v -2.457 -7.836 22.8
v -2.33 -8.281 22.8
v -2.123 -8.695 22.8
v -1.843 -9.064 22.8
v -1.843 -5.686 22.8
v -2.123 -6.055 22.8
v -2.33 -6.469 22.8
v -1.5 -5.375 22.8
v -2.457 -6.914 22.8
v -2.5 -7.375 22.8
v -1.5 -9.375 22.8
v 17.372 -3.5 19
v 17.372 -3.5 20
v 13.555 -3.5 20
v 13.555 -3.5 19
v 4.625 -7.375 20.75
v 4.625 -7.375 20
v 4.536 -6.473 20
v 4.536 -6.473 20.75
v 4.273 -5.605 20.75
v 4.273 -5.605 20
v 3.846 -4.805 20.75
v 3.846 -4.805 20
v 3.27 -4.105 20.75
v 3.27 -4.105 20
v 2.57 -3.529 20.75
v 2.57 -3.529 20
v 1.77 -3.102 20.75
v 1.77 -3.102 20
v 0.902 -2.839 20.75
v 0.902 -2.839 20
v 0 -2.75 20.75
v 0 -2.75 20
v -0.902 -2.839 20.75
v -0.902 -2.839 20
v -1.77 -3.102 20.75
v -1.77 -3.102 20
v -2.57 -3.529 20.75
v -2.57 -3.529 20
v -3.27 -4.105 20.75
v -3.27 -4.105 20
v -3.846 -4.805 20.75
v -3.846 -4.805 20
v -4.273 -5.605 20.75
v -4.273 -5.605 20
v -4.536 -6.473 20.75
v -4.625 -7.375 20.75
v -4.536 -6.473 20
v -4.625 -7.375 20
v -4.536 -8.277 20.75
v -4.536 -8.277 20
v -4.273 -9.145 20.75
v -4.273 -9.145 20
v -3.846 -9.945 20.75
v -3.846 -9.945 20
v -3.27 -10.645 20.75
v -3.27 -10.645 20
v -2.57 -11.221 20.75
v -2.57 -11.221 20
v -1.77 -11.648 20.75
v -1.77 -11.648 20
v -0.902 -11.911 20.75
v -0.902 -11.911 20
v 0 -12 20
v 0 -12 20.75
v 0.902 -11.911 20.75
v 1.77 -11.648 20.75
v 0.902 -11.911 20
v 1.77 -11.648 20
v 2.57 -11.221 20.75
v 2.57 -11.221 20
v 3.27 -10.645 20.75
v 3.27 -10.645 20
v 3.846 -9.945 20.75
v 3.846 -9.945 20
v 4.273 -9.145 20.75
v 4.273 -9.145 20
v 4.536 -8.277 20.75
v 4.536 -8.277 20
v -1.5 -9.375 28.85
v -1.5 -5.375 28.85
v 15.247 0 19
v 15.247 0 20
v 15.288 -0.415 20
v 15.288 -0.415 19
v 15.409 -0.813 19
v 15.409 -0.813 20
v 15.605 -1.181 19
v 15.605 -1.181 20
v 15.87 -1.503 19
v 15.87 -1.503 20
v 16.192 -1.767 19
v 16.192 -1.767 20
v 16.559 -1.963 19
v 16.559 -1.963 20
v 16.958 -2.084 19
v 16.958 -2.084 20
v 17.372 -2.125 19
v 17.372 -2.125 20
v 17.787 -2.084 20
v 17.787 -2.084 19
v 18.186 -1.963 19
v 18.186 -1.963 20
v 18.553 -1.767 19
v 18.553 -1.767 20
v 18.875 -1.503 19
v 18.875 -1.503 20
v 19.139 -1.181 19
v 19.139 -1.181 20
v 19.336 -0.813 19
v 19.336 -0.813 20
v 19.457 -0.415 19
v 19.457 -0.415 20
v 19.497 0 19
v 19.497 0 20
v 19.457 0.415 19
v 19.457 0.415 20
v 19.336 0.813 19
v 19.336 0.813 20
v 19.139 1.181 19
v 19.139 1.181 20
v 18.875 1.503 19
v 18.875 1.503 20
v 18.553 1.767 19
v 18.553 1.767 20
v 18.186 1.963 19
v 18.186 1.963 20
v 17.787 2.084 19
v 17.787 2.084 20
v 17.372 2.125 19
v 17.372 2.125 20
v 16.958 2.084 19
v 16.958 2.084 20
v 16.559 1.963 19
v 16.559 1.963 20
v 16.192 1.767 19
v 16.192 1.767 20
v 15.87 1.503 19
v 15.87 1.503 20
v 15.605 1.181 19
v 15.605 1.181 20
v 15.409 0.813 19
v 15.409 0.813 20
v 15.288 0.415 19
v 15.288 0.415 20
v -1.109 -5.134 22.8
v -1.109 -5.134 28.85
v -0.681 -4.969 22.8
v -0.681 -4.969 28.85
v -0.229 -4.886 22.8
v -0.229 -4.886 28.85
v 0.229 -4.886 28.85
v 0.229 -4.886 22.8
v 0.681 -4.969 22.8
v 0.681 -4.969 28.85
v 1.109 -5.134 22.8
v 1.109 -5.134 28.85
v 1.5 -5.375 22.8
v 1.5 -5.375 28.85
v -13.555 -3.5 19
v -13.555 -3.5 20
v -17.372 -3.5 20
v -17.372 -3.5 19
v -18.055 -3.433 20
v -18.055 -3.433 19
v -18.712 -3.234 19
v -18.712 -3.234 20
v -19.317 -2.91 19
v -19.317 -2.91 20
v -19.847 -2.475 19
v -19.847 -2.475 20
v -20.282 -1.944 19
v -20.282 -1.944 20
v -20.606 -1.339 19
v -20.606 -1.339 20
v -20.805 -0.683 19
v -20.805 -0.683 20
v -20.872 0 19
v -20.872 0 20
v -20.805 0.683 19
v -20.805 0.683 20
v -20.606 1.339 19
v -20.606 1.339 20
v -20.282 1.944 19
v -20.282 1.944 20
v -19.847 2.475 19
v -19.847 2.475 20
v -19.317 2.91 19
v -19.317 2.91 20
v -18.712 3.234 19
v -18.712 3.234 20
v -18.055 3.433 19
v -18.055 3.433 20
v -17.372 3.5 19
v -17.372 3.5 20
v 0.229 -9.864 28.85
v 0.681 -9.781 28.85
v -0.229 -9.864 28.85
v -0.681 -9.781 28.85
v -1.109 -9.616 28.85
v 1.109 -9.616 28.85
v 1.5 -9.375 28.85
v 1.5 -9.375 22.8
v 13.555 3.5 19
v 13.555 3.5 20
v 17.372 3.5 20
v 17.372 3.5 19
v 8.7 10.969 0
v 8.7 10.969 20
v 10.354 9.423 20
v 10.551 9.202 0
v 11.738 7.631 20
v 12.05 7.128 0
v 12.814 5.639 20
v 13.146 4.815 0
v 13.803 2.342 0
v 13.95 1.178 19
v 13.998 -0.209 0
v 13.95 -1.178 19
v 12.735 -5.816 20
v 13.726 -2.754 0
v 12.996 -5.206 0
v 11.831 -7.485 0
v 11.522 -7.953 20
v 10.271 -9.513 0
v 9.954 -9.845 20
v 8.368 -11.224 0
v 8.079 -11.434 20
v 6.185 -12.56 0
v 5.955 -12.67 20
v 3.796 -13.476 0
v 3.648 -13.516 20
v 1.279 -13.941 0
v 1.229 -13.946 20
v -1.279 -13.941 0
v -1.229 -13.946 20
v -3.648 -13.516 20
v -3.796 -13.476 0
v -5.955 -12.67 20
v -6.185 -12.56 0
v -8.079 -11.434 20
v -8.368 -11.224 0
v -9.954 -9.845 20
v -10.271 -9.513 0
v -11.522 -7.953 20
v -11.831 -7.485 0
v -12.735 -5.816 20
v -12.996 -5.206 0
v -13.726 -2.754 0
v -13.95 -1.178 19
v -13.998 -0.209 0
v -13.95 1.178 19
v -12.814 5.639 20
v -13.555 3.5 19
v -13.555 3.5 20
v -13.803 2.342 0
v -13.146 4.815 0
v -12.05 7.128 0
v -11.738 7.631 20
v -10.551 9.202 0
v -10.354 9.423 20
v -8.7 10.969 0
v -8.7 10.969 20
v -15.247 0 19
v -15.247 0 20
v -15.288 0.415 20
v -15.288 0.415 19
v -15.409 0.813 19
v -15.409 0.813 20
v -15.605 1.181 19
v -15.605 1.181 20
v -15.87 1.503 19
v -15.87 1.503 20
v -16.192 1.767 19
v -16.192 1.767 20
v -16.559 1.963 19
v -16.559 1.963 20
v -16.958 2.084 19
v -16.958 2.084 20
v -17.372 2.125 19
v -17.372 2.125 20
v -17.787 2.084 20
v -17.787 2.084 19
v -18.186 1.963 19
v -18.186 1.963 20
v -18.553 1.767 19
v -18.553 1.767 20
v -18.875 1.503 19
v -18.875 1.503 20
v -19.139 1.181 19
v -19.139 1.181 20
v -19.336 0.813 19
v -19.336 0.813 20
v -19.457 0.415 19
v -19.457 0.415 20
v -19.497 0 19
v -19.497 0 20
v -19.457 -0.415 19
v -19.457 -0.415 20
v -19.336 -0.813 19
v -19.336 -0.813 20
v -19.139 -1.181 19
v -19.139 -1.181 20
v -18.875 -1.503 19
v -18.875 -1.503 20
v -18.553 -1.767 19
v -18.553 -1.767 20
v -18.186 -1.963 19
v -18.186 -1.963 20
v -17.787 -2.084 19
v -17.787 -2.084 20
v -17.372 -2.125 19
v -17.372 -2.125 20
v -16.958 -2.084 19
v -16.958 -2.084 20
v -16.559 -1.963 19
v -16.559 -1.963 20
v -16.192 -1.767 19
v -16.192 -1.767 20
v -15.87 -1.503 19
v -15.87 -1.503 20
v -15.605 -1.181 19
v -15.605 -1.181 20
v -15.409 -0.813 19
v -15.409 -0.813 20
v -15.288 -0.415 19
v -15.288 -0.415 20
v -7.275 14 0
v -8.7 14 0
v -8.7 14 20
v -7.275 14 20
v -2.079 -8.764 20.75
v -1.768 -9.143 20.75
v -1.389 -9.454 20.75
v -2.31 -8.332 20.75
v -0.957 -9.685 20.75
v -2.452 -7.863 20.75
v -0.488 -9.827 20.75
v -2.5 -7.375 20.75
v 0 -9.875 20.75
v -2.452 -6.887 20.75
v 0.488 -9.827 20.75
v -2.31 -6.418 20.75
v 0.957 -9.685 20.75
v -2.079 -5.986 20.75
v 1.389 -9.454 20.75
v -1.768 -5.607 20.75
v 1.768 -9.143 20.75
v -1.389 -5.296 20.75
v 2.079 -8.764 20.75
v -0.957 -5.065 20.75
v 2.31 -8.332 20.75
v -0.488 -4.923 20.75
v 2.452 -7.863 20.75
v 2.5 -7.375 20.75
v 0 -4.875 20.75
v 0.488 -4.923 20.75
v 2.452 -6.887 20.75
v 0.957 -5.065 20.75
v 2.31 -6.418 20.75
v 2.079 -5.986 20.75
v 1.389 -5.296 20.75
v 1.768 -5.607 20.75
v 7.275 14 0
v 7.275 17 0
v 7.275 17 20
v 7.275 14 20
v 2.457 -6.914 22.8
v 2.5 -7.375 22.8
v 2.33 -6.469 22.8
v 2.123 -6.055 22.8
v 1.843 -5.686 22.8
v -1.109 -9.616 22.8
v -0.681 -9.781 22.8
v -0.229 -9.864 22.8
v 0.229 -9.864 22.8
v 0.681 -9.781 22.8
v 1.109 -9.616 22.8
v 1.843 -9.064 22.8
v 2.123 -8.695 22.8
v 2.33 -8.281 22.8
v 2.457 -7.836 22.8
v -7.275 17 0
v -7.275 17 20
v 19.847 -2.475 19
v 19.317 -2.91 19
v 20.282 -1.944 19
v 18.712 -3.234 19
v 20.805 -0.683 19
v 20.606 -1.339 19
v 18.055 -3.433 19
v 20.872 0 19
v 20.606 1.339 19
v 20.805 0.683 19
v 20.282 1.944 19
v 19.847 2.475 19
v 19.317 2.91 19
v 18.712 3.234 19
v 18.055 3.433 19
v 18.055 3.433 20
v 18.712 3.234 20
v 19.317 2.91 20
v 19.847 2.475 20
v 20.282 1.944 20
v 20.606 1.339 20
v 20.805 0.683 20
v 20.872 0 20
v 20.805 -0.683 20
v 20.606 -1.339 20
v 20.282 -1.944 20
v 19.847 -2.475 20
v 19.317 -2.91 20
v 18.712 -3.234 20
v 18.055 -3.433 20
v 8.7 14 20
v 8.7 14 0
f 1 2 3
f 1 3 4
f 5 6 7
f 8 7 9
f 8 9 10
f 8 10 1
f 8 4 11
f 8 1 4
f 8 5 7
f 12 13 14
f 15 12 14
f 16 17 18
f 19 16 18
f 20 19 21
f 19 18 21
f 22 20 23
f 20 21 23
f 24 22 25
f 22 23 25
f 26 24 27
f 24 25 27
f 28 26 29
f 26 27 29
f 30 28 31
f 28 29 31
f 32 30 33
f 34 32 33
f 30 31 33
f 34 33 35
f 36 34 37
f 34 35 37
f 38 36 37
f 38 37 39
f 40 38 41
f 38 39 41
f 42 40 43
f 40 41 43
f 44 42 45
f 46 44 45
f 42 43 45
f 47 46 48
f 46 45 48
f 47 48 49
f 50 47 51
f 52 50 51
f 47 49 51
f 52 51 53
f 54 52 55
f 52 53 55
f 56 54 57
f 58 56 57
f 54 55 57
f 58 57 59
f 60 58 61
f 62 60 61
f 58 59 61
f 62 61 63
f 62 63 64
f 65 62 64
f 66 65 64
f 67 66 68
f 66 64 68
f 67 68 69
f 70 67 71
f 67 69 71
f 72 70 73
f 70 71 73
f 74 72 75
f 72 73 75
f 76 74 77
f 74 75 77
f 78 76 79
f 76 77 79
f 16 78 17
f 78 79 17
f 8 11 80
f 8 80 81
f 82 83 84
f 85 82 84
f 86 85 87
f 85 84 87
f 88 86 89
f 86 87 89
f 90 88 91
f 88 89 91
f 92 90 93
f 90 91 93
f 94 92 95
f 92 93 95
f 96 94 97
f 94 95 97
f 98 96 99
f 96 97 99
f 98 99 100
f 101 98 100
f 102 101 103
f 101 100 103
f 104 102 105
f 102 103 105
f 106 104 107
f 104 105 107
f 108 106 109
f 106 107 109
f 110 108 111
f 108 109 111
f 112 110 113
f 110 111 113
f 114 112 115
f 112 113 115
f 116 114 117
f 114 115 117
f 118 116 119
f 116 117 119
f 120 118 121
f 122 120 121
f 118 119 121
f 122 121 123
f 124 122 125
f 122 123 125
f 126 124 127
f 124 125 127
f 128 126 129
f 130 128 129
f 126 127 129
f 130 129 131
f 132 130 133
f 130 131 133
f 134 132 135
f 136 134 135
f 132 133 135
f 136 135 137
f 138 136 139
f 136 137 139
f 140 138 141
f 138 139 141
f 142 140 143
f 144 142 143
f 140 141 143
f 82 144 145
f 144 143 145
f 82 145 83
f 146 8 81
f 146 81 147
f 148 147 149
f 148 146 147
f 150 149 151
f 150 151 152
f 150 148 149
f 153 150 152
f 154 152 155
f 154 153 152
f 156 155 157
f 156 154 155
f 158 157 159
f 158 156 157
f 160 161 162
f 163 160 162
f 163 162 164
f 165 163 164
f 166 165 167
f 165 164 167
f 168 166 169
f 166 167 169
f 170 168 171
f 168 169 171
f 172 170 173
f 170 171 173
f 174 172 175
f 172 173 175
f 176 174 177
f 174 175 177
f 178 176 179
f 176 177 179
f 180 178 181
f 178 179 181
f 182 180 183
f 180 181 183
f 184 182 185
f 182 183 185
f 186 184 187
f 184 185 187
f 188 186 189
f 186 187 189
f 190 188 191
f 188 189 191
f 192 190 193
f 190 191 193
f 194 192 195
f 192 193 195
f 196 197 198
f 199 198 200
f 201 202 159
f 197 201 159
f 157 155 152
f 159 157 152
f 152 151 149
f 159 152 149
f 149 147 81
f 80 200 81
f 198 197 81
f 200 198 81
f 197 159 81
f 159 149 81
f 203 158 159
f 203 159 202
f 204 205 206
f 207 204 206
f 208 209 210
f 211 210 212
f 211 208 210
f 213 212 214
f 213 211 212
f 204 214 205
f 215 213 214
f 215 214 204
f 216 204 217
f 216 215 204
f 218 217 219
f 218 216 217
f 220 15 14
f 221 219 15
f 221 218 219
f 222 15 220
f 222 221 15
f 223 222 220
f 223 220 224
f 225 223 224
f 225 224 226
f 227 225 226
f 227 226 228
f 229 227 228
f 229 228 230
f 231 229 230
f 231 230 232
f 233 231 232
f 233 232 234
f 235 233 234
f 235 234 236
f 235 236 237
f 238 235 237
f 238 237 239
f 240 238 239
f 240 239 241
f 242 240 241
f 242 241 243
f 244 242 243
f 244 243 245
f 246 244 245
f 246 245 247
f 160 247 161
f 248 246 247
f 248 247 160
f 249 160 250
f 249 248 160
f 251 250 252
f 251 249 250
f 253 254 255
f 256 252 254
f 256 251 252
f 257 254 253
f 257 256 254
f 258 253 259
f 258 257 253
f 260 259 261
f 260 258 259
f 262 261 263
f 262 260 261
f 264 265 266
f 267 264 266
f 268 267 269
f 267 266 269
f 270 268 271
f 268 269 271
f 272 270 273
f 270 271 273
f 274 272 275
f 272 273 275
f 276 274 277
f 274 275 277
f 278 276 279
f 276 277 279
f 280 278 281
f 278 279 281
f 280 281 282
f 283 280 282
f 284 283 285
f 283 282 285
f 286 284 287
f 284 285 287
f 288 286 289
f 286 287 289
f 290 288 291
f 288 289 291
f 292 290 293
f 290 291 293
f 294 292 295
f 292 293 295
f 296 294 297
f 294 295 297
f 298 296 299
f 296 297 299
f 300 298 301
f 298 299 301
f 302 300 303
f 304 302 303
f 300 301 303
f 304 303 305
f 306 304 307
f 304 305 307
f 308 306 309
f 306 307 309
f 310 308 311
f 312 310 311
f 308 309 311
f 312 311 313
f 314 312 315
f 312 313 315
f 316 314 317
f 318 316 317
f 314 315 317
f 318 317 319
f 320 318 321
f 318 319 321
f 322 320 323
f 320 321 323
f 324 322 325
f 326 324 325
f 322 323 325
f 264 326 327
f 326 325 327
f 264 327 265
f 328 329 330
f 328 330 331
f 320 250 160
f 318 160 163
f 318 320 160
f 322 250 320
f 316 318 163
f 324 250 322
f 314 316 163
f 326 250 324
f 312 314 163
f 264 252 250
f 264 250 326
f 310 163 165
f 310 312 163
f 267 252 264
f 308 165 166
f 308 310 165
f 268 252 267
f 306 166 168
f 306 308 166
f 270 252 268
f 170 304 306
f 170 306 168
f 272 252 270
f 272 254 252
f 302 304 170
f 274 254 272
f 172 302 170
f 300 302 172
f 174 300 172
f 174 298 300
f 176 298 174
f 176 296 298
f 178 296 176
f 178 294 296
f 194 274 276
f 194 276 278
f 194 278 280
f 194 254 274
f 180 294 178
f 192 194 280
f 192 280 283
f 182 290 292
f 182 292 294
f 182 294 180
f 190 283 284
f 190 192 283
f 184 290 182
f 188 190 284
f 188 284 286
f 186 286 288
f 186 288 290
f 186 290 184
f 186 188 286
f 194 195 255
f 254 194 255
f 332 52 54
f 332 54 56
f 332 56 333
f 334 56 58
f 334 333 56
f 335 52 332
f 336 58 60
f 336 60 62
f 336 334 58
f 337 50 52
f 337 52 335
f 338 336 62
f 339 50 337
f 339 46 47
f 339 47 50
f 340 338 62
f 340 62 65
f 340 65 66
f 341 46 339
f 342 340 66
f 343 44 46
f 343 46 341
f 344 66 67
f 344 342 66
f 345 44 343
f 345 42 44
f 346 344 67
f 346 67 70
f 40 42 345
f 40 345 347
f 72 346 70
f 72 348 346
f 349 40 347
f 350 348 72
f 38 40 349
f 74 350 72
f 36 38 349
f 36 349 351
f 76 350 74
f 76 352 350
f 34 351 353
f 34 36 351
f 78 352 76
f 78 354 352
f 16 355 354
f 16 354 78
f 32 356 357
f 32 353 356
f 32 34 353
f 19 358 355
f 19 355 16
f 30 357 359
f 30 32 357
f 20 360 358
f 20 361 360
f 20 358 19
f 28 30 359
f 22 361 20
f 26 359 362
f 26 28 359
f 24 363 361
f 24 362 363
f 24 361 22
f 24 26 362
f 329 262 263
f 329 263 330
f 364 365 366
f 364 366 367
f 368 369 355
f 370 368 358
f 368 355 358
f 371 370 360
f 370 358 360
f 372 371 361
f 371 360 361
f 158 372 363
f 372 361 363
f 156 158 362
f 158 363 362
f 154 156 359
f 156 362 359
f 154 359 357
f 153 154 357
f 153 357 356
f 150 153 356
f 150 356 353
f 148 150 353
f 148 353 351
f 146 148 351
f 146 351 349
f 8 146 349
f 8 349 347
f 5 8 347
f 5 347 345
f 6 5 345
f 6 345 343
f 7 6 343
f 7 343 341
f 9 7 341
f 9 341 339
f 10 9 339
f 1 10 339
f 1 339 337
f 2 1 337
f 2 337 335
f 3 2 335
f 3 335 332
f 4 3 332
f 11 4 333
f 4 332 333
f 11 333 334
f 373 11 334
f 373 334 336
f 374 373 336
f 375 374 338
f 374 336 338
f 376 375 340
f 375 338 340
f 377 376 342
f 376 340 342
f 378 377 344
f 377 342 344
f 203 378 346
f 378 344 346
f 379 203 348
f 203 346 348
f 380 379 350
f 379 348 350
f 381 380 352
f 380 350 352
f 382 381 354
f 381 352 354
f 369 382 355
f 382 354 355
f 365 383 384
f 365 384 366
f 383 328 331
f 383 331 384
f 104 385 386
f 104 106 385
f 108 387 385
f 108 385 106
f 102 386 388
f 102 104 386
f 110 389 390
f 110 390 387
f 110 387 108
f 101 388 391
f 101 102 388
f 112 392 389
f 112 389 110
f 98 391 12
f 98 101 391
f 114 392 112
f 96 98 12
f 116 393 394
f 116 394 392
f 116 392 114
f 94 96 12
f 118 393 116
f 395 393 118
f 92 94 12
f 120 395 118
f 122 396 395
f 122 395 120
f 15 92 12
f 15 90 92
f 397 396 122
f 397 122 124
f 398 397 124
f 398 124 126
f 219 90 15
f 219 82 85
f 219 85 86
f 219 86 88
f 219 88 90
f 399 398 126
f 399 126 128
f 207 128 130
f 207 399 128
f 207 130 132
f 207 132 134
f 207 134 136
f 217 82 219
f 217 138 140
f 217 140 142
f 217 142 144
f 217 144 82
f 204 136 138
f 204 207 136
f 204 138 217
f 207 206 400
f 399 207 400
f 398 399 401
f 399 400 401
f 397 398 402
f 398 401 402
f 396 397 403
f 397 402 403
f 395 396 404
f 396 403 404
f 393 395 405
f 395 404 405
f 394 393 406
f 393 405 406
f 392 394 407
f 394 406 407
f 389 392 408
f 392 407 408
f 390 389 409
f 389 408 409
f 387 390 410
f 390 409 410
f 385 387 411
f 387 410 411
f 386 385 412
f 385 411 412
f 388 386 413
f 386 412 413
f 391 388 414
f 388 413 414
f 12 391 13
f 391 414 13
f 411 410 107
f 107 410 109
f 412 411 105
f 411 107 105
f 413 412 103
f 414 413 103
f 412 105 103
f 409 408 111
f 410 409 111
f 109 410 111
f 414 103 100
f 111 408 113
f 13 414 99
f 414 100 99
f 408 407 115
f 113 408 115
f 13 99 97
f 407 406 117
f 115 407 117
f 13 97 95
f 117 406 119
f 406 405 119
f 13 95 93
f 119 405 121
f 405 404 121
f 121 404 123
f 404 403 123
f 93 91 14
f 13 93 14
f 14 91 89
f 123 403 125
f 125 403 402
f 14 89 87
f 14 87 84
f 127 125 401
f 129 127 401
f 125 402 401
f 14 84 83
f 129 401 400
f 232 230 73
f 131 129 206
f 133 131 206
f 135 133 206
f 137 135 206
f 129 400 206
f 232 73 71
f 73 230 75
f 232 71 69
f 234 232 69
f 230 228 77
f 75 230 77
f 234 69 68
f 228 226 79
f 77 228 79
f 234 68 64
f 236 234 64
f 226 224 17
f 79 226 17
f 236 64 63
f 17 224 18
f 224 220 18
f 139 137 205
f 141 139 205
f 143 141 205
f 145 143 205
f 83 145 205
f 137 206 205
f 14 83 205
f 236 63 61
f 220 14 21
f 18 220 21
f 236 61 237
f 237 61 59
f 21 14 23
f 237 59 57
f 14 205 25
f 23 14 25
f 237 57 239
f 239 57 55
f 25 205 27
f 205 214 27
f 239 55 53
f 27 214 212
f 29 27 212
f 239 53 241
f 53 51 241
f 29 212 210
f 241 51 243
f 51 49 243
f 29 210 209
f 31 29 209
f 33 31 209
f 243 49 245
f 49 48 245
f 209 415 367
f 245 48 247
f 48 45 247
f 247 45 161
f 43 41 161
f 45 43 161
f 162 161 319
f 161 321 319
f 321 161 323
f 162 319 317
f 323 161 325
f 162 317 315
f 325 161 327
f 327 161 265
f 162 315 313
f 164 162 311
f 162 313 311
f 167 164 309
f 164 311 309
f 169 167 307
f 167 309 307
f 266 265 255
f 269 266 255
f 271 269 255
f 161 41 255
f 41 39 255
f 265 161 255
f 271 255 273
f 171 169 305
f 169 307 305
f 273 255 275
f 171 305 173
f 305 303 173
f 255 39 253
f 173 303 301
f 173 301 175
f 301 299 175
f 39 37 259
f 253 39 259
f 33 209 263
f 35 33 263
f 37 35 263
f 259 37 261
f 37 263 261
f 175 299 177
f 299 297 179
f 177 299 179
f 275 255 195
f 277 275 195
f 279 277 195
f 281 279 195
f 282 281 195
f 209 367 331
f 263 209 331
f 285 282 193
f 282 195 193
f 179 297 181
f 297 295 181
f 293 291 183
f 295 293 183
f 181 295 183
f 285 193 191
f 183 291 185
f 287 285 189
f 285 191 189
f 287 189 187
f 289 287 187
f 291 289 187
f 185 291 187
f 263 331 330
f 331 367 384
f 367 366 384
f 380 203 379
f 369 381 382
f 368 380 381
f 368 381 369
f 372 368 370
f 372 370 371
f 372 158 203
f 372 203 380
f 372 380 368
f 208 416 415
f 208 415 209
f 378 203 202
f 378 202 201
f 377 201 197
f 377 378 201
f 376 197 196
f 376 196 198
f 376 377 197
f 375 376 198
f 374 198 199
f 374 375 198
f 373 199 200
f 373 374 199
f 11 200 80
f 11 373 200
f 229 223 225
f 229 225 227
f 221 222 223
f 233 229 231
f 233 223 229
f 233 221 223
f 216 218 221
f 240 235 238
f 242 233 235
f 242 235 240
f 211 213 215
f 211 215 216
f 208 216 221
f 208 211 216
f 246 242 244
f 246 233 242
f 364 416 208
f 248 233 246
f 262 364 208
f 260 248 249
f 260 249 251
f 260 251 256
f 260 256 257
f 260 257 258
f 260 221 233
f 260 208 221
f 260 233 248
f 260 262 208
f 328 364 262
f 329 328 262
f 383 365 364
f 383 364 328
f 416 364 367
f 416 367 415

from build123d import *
from build123d.topology import SkipClean

# Parameters (mm, degrees)
EXTRUDE_1_DEPTH = 20
SKETCH_2_R      = 2.125
EXTRUDE_2_DEPTH = 1
SKETCH_3_R      = 4.625
EXTRUDE_3_DEPTH = 0.75
SKETCH_4_R      = 2.5
EXTRUDE_4_DEPTH = 2.05
EXTRUDE_5_DEPTH = 6.05


with BuildPart() as part:
    # Sketch 1 → Extrude 1 (new body)
    with BuildSketch(Plane.XY):
        with BuildLine():
            Line((-7.275, 17), (7.275, 17))
            Line((7.275, 17), (7.275, 14))
            Line((7.275, 14), (8.7, 14))
            Line((8.7, 14), (8.7, 10.968591523))
            ThreePointArc((8.7, 10.968591523), (0, -14), (-8.7, 10.968591523))
            Line((-8.7, 10.968591523), (-8.7, 14))
            Line((-8.7, 14), (-7.275, 14))
            Line((-7.275, 14), (-7.275, 17))
        make_face()
    extrude(amount=EXTRUDE_1_DEPTH)

    # Sketch 2 → Extrude 2 (add)
    with BuildSketch(Plane.XY.offset(20)):
        with BuildLine():
            Line((-17.372355088, 3.5), (17.372355088, 3.5))
            ThreePointArc((17.372355088, 3.5), (20.872355088, 0), (17.372355088, -3.5))
            Line((17.372355088, -3.5), (-17.372355088, -3.5))
            ThreePointArc((-17.372355088, -3.5), (-20.872355088, 0), (-17.372355088, 3.5))
        make_face()
        with Locations((-17.372355088, 0)):
            Circle(SKETCH_2_R, mode=Mode.SUBTRACT)
        with Locations(Location((17.372355088, 0, 0), (0, 0, 180))):
            Circle(SKETCH_2_R, mode=Mode.SUBTRACT)
    extrude(amount=-EXTRUDE_2_DEPTH)

    # Sketch 3 → Extrude 3 (add)
    with BuildSketch(Plane.XY.offset(20)):
        with Locations((0, -7.375)):
            Circle(SKETCH_3_R)
    extrude(amount=EXTRUDE_3_DEPTH)

    # Sketch 4 → Extrude 4 (add)
    with BuildSketch(Plane.XY.offset(20.75)):
        with Locations((0, -7.375)):
            Circle(SKETCH_4_R)
    extrude(amount=EXTRUDE_4_DEPTH)

    # Sketch 5 → Extrude 5 (add)
    with SkipClean():  # the faces are left unmerged after this step: merging them gives an invalid solid
        with BuildSketch(Plane.XY.offset(22.8)):
            with BuildLine():
                Line((-1.5, -9.375), (-1.5, -5.375))
                ThreePointArc((-1.5, -5.375), (0, -4.875), (1.5, -5.375))
                Line((1.5, -5.375), (1.5, -9.375))
                ThreePointArc((1.5, -9.375), (0, -9.875), (-1.5, -9.375))
            make_face()
        extrude(amount=EXTRUDE_5_DEPTH)


solid = part.part
